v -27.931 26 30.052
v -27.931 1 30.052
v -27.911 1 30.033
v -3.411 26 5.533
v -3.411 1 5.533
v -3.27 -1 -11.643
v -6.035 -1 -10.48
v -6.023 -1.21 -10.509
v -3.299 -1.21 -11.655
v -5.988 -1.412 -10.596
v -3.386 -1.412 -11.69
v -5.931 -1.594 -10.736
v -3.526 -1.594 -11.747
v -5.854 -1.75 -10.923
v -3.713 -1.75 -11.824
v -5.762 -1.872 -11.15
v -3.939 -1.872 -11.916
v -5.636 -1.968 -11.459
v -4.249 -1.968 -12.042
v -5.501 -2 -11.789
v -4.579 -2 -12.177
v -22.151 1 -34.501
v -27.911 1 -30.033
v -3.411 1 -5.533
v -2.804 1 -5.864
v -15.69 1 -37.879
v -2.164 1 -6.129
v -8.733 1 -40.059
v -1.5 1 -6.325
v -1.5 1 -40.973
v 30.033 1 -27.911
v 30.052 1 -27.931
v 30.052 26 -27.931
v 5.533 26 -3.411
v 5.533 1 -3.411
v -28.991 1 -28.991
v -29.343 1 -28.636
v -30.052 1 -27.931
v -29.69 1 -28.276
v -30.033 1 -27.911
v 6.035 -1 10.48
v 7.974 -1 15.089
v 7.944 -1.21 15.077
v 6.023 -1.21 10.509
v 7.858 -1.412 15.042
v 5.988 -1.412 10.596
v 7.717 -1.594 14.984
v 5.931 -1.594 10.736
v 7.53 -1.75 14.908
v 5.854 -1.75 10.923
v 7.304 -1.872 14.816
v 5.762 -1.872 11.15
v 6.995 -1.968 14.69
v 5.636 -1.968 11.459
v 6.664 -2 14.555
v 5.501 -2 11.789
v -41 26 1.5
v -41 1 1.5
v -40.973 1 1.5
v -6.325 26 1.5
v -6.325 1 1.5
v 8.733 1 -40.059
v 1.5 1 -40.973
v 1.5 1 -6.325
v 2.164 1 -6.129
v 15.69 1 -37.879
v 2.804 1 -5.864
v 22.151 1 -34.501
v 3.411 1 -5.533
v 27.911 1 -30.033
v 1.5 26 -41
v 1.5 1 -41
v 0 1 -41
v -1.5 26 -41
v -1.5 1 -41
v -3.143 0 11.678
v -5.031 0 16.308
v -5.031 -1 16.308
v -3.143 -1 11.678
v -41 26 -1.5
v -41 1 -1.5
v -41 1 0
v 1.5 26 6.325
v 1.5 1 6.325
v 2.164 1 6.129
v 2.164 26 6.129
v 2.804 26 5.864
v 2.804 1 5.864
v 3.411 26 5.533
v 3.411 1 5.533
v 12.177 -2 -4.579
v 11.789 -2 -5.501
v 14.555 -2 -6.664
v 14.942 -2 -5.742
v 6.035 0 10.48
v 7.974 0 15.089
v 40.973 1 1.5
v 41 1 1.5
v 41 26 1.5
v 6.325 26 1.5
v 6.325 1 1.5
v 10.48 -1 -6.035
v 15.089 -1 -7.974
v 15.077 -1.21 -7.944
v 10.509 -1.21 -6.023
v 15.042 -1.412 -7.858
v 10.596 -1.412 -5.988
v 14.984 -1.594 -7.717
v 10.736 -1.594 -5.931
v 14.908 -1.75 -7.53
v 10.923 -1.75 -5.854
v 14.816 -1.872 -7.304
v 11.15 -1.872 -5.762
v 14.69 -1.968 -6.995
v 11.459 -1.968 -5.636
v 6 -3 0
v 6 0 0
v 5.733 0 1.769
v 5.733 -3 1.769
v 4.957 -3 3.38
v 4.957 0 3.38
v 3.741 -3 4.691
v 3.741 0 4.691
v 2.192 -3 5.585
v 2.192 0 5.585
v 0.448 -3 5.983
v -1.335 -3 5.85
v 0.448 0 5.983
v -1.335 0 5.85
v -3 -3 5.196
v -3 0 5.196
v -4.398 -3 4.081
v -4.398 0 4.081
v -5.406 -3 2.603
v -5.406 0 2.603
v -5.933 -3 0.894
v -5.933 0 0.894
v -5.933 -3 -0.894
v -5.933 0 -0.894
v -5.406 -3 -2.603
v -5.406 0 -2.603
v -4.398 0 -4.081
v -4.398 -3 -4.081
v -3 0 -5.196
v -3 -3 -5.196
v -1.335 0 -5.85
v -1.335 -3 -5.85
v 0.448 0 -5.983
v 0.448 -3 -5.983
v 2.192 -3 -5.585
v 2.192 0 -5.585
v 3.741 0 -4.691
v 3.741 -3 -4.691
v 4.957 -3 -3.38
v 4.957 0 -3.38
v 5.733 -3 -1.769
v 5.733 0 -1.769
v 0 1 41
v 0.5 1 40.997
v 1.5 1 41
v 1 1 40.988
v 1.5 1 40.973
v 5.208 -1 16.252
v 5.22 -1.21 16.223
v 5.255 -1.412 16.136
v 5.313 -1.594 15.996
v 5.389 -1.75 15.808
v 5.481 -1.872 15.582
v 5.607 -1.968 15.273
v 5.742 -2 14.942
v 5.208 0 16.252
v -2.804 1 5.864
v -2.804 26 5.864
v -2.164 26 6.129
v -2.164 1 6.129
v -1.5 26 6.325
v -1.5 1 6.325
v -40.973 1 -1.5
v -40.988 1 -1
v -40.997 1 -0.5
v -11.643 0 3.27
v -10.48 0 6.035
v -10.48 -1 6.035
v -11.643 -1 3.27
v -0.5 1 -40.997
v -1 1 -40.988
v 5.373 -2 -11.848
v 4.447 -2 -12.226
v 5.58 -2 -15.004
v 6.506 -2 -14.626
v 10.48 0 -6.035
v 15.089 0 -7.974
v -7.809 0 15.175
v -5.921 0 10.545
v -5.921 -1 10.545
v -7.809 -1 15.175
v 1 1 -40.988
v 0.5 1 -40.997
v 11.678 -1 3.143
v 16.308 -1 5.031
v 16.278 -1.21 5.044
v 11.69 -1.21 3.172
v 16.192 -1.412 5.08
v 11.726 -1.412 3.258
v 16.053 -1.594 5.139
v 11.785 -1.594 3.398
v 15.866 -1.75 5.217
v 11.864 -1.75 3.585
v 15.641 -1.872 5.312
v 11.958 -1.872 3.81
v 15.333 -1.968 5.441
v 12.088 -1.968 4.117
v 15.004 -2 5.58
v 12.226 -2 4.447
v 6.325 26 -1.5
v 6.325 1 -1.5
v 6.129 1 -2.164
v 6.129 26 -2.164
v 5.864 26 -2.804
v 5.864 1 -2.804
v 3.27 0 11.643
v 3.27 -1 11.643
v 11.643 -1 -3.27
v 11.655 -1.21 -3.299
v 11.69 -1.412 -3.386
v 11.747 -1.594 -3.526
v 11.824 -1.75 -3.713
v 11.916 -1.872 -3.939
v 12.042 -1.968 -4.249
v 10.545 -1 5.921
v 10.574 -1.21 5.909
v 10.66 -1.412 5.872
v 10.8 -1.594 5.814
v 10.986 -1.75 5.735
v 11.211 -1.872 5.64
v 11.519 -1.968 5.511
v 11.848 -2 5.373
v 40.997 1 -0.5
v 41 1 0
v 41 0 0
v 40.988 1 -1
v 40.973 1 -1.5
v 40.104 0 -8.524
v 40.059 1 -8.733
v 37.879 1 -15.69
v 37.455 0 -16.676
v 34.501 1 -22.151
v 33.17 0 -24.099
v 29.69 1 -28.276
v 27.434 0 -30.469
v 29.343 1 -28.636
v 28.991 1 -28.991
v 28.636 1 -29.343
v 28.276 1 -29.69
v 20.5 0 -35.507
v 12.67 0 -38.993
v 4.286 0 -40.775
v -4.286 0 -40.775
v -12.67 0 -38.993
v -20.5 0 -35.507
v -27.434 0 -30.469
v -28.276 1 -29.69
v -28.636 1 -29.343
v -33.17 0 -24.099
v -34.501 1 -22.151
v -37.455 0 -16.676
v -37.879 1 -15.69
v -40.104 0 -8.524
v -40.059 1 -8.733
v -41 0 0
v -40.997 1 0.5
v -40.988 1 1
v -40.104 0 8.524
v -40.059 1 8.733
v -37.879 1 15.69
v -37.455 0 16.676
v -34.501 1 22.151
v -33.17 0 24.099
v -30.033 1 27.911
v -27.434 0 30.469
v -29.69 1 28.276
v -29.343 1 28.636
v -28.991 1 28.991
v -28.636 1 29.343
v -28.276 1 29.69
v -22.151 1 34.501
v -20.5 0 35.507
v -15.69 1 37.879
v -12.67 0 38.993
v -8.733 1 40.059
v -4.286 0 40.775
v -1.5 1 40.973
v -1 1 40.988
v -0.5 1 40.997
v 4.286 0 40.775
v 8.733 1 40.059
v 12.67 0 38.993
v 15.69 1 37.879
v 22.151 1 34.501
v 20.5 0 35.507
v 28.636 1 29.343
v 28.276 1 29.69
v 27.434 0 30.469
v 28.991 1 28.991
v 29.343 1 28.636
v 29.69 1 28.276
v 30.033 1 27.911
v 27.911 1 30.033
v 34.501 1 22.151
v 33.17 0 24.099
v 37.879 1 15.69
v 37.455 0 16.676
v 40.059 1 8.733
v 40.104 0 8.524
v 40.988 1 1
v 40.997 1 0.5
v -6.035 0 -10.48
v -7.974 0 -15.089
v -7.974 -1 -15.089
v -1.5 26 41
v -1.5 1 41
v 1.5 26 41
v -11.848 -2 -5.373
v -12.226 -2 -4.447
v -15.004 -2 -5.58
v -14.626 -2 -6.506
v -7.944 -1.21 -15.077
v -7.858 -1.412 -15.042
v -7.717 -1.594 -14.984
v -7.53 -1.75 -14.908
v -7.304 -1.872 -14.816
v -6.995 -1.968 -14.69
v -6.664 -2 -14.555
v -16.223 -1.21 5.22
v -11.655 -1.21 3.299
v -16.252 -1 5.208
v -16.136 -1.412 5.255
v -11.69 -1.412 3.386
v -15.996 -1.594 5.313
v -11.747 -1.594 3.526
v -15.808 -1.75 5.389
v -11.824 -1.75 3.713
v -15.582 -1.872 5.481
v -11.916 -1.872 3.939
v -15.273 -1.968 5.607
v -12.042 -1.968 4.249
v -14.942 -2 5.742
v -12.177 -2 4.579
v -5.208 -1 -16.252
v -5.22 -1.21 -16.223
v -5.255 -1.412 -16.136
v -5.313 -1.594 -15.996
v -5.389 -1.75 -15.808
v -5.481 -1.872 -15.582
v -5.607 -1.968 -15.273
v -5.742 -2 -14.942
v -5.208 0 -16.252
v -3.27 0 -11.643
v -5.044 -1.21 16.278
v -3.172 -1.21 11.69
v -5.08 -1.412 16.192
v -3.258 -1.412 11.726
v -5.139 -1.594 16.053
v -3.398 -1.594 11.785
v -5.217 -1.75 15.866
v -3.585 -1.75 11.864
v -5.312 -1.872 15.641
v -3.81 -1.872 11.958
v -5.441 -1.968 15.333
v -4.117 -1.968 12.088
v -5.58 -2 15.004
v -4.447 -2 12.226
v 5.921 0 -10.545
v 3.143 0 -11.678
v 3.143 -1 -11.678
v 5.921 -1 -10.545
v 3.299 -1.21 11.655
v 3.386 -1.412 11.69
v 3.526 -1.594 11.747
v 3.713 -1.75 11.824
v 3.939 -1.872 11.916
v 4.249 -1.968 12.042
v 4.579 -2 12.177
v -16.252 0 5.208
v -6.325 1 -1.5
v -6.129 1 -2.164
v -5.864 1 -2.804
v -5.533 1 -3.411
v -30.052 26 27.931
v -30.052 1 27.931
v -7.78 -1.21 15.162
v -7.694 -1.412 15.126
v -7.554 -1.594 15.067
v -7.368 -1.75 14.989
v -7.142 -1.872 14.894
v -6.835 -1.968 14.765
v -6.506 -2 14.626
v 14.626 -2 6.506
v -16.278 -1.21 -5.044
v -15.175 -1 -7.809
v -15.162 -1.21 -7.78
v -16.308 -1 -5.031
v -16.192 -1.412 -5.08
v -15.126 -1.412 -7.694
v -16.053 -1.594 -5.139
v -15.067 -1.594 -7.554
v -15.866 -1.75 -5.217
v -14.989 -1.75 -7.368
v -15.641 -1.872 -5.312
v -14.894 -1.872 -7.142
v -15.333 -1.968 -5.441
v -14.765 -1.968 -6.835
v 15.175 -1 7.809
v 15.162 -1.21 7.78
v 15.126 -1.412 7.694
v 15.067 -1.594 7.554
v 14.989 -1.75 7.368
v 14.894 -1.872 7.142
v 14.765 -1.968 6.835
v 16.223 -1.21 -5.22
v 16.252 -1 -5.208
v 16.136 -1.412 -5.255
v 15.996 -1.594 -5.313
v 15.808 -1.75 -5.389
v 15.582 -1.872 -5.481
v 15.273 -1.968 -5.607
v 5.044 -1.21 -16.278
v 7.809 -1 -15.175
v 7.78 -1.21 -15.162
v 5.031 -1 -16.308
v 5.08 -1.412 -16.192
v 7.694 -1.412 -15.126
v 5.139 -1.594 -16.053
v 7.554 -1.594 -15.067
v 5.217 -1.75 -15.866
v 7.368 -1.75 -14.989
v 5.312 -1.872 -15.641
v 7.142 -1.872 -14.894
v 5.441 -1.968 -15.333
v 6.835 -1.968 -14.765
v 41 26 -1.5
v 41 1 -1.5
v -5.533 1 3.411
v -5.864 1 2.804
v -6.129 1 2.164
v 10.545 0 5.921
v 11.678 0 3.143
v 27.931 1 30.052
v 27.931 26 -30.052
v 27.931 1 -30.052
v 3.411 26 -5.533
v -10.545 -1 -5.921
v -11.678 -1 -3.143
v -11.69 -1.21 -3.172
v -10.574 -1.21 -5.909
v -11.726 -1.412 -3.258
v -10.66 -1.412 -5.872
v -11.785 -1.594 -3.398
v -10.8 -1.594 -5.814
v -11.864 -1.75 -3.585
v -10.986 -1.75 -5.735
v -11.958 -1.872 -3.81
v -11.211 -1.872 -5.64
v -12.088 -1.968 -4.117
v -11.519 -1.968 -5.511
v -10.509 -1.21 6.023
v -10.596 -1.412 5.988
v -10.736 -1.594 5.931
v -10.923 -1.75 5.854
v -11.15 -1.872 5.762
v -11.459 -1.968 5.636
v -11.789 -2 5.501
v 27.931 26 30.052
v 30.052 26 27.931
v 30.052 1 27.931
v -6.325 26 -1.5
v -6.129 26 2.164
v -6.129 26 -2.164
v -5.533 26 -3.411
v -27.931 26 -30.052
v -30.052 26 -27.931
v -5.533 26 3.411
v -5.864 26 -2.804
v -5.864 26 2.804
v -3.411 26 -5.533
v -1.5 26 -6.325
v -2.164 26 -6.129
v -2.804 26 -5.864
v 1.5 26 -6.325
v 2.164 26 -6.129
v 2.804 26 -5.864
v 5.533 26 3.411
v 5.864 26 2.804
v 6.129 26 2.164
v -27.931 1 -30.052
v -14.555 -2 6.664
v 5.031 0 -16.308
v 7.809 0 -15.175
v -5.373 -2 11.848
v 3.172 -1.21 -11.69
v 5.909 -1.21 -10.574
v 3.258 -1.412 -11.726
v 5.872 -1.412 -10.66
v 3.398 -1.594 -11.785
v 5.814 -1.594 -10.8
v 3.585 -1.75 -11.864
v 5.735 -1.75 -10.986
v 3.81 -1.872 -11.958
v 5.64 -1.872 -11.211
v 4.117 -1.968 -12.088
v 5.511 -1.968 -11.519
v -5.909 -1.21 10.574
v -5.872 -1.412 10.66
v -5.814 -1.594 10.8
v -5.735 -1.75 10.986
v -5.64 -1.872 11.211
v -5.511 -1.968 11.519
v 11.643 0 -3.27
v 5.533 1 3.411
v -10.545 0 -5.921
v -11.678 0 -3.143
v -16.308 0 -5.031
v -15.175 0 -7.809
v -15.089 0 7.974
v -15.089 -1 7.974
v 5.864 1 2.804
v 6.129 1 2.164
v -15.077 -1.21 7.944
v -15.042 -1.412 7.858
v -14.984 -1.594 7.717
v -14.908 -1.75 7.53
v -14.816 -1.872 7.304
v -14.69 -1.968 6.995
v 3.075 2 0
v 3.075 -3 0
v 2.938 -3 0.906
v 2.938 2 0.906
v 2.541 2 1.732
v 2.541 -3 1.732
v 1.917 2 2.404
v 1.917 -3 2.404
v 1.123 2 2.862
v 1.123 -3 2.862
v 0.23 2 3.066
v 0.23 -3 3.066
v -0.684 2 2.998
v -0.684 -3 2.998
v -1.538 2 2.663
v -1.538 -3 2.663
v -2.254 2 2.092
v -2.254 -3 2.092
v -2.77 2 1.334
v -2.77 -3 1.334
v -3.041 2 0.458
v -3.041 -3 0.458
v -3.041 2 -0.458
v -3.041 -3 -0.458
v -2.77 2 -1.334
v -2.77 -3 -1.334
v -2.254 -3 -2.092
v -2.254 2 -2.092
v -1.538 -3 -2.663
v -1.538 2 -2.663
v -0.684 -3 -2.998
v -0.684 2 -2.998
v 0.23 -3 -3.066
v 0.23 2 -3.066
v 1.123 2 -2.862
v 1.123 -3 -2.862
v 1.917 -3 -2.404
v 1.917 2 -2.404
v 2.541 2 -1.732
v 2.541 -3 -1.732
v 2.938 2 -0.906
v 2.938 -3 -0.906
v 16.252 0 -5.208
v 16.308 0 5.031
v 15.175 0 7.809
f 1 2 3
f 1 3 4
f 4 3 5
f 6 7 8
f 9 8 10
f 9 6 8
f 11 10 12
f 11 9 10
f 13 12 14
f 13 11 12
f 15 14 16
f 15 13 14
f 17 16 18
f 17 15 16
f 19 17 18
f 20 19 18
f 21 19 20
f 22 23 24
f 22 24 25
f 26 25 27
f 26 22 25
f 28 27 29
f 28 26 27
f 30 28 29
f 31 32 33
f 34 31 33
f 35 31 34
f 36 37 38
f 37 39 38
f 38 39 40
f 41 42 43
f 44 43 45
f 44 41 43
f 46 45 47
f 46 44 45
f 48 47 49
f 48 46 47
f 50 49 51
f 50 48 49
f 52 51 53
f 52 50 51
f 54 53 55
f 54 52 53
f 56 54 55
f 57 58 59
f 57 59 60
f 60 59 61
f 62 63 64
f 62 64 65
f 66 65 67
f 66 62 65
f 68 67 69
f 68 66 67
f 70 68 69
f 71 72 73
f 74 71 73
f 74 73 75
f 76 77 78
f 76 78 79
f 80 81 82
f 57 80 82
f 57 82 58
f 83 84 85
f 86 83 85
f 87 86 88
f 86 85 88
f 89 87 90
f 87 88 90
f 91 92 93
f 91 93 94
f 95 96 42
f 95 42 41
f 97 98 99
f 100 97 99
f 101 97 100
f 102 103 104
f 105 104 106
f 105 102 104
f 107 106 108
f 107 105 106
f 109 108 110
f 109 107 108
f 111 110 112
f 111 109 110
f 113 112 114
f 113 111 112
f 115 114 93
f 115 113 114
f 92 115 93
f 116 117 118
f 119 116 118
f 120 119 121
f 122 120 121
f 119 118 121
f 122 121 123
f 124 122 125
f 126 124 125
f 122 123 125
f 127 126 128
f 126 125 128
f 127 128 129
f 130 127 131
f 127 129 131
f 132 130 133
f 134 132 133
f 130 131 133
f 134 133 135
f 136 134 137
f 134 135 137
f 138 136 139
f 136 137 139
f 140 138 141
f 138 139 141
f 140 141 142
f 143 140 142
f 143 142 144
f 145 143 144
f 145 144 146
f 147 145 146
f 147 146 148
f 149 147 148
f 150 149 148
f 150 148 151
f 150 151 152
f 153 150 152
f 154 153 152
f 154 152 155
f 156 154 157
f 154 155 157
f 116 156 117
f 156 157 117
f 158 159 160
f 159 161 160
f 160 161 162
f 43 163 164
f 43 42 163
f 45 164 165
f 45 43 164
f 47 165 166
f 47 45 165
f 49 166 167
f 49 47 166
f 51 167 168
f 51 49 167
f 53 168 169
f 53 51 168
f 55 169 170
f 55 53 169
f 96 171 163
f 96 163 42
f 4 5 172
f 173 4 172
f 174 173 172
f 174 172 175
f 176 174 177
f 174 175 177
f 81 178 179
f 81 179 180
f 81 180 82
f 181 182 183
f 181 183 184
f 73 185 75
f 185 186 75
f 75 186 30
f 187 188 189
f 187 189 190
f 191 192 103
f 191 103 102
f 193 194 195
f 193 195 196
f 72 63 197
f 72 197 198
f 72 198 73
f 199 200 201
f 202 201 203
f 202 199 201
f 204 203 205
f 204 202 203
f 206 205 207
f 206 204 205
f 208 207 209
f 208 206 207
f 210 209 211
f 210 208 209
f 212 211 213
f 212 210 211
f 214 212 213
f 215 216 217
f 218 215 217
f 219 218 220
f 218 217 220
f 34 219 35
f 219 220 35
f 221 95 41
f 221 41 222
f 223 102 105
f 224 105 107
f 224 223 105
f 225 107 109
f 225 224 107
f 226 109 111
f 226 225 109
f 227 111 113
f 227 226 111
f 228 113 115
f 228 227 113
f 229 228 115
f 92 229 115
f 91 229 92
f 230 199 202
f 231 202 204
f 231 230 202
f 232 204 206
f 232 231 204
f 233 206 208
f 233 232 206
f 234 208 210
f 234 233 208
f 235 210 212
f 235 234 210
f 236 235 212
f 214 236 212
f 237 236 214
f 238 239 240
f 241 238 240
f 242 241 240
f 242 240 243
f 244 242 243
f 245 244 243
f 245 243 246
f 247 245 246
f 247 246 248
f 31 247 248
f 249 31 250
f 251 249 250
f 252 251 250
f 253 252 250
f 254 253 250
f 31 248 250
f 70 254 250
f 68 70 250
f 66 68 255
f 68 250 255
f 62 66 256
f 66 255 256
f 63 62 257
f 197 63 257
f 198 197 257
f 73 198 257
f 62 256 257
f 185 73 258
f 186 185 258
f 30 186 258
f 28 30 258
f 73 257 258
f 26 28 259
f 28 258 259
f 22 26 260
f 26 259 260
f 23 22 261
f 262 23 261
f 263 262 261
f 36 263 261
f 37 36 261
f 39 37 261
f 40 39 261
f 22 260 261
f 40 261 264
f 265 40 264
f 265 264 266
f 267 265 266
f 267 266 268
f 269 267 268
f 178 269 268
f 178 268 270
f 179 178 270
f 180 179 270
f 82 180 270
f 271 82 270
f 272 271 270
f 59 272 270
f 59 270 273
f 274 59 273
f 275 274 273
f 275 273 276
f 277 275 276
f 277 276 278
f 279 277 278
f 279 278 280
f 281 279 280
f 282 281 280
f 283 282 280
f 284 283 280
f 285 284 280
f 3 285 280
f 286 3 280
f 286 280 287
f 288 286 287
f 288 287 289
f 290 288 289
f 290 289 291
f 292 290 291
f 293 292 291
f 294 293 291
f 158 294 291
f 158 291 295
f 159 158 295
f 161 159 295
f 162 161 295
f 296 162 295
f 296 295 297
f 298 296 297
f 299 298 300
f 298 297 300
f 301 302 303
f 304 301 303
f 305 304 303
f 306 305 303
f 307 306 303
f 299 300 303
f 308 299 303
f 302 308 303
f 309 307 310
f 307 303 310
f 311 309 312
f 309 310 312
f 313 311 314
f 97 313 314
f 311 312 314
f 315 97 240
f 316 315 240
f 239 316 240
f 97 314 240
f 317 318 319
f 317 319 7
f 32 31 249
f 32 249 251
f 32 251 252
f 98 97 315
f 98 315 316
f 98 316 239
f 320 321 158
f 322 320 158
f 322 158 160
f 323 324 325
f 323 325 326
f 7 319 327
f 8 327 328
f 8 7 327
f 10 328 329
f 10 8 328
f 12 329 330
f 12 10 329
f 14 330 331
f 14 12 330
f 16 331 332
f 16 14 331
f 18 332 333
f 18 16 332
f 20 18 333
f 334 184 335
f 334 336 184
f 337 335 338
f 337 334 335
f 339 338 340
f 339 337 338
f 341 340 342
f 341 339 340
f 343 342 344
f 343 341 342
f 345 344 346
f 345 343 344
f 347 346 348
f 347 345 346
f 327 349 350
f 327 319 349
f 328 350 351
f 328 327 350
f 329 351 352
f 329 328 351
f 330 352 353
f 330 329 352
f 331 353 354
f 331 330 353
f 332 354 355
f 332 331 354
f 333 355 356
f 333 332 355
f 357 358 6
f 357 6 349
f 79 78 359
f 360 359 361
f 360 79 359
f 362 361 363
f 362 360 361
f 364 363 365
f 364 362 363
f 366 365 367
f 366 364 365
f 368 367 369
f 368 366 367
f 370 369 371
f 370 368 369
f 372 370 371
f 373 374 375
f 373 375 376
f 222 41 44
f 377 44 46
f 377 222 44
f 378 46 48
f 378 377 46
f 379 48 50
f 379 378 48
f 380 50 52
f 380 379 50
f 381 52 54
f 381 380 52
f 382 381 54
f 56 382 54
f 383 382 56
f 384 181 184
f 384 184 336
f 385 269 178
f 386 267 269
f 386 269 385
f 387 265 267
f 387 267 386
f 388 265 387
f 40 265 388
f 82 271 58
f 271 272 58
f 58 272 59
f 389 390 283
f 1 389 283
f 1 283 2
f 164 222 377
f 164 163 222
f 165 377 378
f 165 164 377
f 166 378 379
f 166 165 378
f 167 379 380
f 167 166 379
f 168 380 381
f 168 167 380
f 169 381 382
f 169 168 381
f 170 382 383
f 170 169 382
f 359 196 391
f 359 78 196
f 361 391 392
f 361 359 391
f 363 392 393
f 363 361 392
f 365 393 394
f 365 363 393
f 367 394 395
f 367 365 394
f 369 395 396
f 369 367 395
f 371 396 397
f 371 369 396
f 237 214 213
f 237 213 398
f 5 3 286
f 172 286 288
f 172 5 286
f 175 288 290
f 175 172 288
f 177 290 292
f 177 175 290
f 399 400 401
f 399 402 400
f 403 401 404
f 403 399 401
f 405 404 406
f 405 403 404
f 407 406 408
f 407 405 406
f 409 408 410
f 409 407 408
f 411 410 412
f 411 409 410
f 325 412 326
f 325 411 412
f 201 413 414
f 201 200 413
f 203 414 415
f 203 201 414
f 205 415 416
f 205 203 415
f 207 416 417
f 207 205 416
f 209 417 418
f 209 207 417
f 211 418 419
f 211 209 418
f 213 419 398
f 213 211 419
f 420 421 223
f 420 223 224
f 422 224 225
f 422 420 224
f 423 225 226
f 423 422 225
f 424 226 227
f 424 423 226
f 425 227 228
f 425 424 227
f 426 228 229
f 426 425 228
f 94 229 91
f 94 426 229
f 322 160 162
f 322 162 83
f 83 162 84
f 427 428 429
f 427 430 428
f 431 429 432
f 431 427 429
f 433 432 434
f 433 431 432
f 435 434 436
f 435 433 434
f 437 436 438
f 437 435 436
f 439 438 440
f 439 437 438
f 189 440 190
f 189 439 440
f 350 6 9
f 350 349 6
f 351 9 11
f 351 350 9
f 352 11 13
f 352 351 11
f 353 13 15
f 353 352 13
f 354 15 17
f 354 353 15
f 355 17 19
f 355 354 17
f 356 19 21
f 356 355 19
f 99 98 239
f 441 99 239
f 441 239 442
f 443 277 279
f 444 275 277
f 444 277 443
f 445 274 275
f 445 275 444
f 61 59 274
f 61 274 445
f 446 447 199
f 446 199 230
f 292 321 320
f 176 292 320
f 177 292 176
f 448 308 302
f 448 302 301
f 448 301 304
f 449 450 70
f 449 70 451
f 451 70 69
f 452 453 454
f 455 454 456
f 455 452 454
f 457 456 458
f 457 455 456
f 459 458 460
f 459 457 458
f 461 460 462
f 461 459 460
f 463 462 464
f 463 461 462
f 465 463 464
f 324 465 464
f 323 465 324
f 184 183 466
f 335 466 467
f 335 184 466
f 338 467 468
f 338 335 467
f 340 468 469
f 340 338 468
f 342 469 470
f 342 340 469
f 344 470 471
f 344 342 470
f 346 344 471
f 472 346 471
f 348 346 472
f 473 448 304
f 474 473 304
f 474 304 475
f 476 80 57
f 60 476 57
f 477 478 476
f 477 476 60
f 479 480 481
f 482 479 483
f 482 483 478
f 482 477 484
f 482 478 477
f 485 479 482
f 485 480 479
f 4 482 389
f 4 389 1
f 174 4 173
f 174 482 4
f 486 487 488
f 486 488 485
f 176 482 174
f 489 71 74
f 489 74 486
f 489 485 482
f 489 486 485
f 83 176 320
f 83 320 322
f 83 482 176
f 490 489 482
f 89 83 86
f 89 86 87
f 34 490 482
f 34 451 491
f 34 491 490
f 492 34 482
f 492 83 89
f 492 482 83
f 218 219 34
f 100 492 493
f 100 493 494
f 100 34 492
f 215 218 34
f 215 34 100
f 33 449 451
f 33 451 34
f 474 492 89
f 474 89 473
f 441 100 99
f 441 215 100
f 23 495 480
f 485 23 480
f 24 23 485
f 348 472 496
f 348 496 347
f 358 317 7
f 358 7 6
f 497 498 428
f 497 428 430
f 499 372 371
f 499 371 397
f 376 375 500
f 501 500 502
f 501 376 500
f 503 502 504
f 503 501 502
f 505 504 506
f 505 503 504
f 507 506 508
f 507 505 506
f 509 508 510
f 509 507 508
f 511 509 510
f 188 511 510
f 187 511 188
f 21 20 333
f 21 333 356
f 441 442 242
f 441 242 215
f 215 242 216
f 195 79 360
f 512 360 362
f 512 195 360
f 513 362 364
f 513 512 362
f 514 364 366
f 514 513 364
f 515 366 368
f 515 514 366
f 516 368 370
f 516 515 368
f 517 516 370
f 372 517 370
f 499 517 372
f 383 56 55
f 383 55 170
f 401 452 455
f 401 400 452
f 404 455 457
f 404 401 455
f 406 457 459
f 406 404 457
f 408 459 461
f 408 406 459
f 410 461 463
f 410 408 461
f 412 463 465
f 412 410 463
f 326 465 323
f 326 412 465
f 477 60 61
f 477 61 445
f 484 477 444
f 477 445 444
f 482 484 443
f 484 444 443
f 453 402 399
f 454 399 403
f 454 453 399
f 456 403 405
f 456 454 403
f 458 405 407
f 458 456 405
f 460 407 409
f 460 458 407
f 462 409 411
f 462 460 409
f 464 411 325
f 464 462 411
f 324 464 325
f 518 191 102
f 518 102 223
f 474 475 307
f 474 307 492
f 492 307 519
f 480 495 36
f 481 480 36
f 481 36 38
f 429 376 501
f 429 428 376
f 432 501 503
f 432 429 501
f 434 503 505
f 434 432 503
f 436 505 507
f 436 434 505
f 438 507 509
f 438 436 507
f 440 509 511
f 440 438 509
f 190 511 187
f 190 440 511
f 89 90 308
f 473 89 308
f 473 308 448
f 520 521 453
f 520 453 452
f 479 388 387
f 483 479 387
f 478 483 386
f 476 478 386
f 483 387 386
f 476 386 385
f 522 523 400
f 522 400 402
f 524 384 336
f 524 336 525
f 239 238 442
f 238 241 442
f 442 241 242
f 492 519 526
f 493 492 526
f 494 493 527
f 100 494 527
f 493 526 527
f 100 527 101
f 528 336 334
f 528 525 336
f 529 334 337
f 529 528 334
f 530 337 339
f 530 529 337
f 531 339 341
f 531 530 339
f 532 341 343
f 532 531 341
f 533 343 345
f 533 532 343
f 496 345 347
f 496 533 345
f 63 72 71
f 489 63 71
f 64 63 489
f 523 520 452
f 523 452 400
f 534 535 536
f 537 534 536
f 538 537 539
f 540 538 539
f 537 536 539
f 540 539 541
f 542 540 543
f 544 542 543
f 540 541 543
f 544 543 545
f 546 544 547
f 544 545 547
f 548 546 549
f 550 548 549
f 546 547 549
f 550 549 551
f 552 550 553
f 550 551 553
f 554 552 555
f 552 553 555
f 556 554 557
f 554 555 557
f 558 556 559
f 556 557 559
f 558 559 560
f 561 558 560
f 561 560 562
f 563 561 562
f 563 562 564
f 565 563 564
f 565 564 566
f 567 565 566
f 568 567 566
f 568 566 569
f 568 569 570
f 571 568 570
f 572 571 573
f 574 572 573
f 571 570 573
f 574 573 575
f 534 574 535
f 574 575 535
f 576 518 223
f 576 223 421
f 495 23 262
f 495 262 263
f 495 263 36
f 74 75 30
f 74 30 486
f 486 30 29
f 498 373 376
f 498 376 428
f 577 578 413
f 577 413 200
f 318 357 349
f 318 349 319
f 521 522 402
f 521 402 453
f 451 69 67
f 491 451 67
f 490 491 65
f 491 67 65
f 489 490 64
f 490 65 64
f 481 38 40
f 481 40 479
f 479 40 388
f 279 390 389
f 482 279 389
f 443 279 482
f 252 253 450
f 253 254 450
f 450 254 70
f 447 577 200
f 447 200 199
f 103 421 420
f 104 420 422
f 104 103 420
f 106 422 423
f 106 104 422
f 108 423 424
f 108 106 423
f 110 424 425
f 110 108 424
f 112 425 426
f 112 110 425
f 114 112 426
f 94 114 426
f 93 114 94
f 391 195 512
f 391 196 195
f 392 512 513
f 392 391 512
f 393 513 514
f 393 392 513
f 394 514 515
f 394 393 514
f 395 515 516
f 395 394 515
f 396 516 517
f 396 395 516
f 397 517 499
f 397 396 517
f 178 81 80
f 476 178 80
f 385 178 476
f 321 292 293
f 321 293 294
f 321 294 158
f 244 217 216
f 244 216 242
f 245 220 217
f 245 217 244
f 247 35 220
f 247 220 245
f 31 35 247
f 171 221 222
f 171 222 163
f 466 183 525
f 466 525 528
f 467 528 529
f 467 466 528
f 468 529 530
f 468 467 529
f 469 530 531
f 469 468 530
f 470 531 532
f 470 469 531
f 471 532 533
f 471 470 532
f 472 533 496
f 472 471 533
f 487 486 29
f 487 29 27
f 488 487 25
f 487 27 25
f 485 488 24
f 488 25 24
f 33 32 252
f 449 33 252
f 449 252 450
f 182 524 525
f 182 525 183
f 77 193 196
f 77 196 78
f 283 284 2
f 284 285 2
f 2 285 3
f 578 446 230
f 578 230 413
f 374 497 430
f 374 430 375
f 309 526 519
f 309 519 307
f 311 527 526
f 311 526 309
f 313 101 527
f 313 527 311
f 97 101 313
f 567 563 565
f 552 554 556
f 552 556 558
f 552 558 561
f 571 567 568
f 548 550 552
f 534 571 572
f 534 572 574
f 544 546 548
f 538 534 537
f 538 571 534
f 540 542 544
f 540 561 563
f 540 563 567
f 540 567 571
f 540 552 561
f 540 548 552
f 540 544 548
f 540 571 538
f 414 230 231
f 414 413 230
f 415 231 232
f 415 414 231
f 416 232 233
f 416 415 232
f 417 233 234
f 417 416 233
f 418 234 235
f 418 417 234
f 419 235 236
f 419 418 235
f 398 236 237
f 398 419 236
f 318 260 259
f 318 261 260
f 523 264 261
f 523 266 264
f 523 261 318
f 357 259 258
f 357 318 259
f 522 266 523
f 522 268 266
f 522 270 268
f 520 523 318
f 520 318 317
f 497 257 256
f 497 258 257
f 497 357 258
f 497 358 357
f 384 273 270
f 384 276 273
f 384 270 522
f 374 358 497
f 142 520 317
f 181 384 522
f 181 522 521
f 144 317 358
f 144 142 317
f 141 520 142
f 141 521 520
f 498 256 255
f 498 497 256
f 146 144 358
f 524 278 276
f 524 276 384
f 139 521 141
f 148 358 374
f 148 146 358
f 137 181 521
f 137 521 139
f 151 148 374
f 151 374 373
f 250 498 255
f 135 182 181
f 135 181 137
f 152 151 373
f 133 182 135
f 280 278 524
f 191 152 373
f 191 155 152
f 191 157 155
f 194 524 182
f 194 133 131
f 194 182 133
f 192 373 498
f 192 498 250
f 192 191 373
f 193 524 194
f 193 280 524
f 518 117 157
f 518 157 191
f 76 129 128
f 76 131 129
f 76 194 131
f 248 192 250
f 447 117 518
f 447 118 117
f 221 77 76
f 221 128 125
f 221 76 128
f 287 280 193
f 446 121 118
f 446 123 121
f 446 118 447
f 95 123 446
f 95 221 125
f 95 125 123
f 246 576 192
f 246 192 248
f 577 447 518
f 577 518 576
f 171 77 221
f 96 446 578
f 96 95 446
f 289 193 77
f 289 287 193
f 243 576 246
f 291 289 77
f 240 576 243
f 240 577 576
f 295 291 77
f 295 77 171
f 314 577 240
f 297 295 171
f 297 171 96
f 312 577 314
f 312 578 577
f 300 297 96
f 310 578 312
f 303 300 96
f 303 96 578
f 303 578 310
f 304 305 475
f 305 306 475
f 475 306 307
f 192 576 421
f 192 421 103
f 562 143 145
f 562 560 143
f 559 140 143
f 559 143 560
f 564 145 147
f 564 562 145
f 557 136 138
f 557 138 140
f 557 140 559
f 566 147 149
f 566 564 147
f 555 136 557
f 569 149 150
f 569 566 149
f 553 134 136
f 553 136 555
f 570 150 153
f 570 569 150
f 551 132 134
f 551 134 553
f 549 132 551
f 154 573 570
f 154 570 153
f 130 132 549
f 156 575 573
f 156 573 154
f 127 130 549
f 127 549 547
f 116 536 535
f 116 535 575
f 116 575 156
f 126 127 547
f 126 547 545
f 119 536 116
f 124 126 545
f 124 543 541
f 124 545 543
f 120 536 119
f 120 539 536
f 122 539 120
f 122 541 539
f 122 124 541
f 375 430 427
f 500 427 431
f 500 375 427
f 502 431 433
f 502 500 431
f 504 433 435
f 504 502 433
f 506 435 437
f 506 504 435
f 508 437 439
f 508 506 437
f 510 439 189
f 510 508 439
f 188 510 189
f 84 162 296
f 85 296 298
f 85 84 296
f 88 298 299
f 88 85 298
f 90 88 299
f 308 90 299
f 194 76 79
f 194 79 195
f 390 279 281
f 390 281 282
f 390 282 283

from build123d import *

# Parameters (mm, degrees)
SKETCH1_R            = 41
BOSS_EXTRUDE1_DEPTH  = 1
SKETCH6_W            = 3
SKETCH6_H            = 41
BOSS_EXTRUDE7_DEPTH  = 25
SKETCH7_R            = 6
BOSS_EXTRUDE8_DEPTH  = 24
SKETCH9_R            = 6
CUT_EXTRUDE3_DEPTH   = 5
CIRPATTERN1_COUNT    = 8
SKETCH11_R           = 6
CUT_EXTRUDE5_DEPTH   = 6
BOSS_EXTRUDE9_DEPTH  = 2
CIRPATTERN2_COUNT    = 8
FILLET1_R            = 1
SKETCH13_R           = 6.5
BOSS_EXTRUDE17_DEPTH = 6
SKETCH16_R           = 6.5
SKETCH16_R_2         = 6
BOSS_EXTRUDE18_DEPTH = 25
SKETCH15_R           = 6
BOSS_EXTRUDE19_DEPTH = 3
SKETCH17_R           = 3.075
CUT_EXTRUDE10_DEPTH  = 5


with BuildPart() as part:
    # Sketch1 → Boss-Extrude1 (new body)
    with BuildSketch(Plane(origin=(0, 0, 0), x_dir=(1, 0, 0), z_dir=(0, 1, 0))):
        Circle(SKETCH1_R)
    extrude(amount=BOSS_EXTRUDE1_DEPTH)

    # Sketch6 → Boss-Extrude7 (add)
    with BuildSketch(Plane(origin=(0, 1, 0), x_dir=(1, 0, 0), z_dir=(0, 1, 0))):
        with Locations((0, -20.5)):
            Rectangle(SKETCH6_W, SKETCH6_H)
    boss_extrude7 = extrude(amount=BOSS_EXTRUDE7_DEPTH)

    # Sketch7 → Boss-Extrude8 (add)
    with BuildSketch(Plane.XZ):
        Circle(SKETCH7_R)
    extrude(amount=-BOSS_EXTRUDE8_DEPTH)

    # Sketch9 → Cut-Extrude3 (cut)
    with BuildSketch(Plane(origin=(0, 26, 0), x_dir=(1, 0, 0), z_dir=(0, 1, 0))):
        Circle(SKETCH9_R)
    extrude(amount=-CUT_EXTRUDE3_DEPTH, mode=Mode.SUBTRACT)

    # CirPattern1: Boss-Extrude7 ×8 about axis
    cirpattern1_axis = Axis((0, 0, 0), (0, 1, 0))
    for i in range(1, CIRPATTERN1_COUNT):
        add(boss_extrude7.rotate(cirpattern1_axis, i * 360 / CIRPATTERN1_COUNT))

    # Sketch11 → Cut-Extrude5 (cut)
    with BuildSketch(Plane(origin=(0, 26, 0), x_dir=(1, 0, 0), z_dir=(0, 1, 0))):
        Circle(SKETCH11_R)
    extrude(amount=-CUT_EXTRUDE5_DEPTH, mode=Mode.SUBTRACT)

    # Sketch10 → Boss-Extrude9 (add)
    with BuildSketch(Plane(origin=(0, 0, 0), x_dir=(-1, 0, 0), z_dir=(0, -1, 0))):
        Polygon((-3.142992858, 11.677824964), (-5.920826915, 10.544847493), (-7.809122701, 15.174570921), (-5.031288644, 16.307548393), align=None)
    boss_extrude9 = extrude(amount=BOSS_EXTRUDE9_DEPTH)

    # CirPattern2: Boss-Extrude9 ×8 about axis
    cirpattern2_axis = Axis((0, 0, 0), (0, 1, 0))
    for i in range(1, CIRPATTERN2_COUNT):
        add(boss_extrude9.rotate(cirpattern2_axis, i * 360 / CIRPATTERN2_COUNT))

    # Fillet1
    fillet1_edges = [part.edges().sort_by_distance(p)[0] for p in [
        (4.087140751, -2, -13.992686678),
        (6.420205673, -2, -15.741059657),
        (6.864974808, -2, -12.859709207),
        (4.531909887, -2, -11.111336228),
        (-7.004278697, -2, -12.784368578),
        (-6.590839059, -2, -15.670380994),
        (-4.238917345, -2, -13.947457824),
        (-4.652356983, -2, -11.061445408),
        (-13.992686678, -2, -4.087140751),
        (-15.741059657, -2, -6.420205673),
        (-12.859709207, -2, -6.864974808),
        (-11.111336228, -2, -4.531909887),
        (-12.784368578, -2, 7.004278697),
        (-15.670380994, -2, 6.590839059),
        (-13.947457824, -2, 4.238917345),
        (-11.061445408, -2, 4.652356983),
        (-4.087140751, -2, 13.992686678),
        (-6.420205673, -2, 15.741059657),
        (-6.864974808, -2, 12.859709207),
        (-4.531909887, -2, 11.111336228),
        (7.004278697, -2, 12.784368578),
        (6.590839059, -2, 15.670380994),
        (4.238917345, -2, 13.947457824),
        (4.652356983, -2, 11.061445408),
        (13.992686678, -2, 4.087140751),
        (15.741059657, -2, 6.420205673),
        (12.859709207, -2, 6.864974808),
        (11.111336228, -2, 4.531909887),
        (12.784368578, -2, -7.004278697),
        (15.670380994, -2, -6.590839059),
        (13.947457824, -2, -4.238917345),
        (11.061445408, -2, -4.652356983),
    ]]
    fillet(fillet1_edges, radius=FILLET1_R)

    # Sketch13 → Boss-Extrude17 (add)
    with BuildSketch(Plane(origin=(0, 20, 0), x_dir=(1, 0, 0), z_dir=(0, 1, 0))):
        Circle(SKETCH13_R)
    extrude(amount=BOSS_EXTRUDE17_DEPTH)

    # Sketch16 → Boss-Extrude18 (add)
    with BuildSketch(Plane(origin=(0, 26, 0), x_dir=(1, 0, 0), z_dir=(0, 1, 0))):
        Circle(SKETCH16_R)
        Circle(SKETCH16_R_2, mode=Mode.SUBTRACT)
    extrude(amount=-BOSS_EXTRUDE18_DEPTH)

    # Sketch15 → Boss-Extrude19 (add)
    with BuildSketch(Plane.XZ):
        Circle(SKETCH15_R)
    extrude(amount=BOSS_EXTRUDE19_DEPTH)

    # Sketch17 → Cut-Extrude10 (cut)
    with BuildSketch(Plane.XZ.offset(3)):
        Circle(SKETCH17_R)
    extrude(amount=-CUT_EXTRUDE10_DEPTH, mode=Mode.SUBTRACT)


solid = part.part
